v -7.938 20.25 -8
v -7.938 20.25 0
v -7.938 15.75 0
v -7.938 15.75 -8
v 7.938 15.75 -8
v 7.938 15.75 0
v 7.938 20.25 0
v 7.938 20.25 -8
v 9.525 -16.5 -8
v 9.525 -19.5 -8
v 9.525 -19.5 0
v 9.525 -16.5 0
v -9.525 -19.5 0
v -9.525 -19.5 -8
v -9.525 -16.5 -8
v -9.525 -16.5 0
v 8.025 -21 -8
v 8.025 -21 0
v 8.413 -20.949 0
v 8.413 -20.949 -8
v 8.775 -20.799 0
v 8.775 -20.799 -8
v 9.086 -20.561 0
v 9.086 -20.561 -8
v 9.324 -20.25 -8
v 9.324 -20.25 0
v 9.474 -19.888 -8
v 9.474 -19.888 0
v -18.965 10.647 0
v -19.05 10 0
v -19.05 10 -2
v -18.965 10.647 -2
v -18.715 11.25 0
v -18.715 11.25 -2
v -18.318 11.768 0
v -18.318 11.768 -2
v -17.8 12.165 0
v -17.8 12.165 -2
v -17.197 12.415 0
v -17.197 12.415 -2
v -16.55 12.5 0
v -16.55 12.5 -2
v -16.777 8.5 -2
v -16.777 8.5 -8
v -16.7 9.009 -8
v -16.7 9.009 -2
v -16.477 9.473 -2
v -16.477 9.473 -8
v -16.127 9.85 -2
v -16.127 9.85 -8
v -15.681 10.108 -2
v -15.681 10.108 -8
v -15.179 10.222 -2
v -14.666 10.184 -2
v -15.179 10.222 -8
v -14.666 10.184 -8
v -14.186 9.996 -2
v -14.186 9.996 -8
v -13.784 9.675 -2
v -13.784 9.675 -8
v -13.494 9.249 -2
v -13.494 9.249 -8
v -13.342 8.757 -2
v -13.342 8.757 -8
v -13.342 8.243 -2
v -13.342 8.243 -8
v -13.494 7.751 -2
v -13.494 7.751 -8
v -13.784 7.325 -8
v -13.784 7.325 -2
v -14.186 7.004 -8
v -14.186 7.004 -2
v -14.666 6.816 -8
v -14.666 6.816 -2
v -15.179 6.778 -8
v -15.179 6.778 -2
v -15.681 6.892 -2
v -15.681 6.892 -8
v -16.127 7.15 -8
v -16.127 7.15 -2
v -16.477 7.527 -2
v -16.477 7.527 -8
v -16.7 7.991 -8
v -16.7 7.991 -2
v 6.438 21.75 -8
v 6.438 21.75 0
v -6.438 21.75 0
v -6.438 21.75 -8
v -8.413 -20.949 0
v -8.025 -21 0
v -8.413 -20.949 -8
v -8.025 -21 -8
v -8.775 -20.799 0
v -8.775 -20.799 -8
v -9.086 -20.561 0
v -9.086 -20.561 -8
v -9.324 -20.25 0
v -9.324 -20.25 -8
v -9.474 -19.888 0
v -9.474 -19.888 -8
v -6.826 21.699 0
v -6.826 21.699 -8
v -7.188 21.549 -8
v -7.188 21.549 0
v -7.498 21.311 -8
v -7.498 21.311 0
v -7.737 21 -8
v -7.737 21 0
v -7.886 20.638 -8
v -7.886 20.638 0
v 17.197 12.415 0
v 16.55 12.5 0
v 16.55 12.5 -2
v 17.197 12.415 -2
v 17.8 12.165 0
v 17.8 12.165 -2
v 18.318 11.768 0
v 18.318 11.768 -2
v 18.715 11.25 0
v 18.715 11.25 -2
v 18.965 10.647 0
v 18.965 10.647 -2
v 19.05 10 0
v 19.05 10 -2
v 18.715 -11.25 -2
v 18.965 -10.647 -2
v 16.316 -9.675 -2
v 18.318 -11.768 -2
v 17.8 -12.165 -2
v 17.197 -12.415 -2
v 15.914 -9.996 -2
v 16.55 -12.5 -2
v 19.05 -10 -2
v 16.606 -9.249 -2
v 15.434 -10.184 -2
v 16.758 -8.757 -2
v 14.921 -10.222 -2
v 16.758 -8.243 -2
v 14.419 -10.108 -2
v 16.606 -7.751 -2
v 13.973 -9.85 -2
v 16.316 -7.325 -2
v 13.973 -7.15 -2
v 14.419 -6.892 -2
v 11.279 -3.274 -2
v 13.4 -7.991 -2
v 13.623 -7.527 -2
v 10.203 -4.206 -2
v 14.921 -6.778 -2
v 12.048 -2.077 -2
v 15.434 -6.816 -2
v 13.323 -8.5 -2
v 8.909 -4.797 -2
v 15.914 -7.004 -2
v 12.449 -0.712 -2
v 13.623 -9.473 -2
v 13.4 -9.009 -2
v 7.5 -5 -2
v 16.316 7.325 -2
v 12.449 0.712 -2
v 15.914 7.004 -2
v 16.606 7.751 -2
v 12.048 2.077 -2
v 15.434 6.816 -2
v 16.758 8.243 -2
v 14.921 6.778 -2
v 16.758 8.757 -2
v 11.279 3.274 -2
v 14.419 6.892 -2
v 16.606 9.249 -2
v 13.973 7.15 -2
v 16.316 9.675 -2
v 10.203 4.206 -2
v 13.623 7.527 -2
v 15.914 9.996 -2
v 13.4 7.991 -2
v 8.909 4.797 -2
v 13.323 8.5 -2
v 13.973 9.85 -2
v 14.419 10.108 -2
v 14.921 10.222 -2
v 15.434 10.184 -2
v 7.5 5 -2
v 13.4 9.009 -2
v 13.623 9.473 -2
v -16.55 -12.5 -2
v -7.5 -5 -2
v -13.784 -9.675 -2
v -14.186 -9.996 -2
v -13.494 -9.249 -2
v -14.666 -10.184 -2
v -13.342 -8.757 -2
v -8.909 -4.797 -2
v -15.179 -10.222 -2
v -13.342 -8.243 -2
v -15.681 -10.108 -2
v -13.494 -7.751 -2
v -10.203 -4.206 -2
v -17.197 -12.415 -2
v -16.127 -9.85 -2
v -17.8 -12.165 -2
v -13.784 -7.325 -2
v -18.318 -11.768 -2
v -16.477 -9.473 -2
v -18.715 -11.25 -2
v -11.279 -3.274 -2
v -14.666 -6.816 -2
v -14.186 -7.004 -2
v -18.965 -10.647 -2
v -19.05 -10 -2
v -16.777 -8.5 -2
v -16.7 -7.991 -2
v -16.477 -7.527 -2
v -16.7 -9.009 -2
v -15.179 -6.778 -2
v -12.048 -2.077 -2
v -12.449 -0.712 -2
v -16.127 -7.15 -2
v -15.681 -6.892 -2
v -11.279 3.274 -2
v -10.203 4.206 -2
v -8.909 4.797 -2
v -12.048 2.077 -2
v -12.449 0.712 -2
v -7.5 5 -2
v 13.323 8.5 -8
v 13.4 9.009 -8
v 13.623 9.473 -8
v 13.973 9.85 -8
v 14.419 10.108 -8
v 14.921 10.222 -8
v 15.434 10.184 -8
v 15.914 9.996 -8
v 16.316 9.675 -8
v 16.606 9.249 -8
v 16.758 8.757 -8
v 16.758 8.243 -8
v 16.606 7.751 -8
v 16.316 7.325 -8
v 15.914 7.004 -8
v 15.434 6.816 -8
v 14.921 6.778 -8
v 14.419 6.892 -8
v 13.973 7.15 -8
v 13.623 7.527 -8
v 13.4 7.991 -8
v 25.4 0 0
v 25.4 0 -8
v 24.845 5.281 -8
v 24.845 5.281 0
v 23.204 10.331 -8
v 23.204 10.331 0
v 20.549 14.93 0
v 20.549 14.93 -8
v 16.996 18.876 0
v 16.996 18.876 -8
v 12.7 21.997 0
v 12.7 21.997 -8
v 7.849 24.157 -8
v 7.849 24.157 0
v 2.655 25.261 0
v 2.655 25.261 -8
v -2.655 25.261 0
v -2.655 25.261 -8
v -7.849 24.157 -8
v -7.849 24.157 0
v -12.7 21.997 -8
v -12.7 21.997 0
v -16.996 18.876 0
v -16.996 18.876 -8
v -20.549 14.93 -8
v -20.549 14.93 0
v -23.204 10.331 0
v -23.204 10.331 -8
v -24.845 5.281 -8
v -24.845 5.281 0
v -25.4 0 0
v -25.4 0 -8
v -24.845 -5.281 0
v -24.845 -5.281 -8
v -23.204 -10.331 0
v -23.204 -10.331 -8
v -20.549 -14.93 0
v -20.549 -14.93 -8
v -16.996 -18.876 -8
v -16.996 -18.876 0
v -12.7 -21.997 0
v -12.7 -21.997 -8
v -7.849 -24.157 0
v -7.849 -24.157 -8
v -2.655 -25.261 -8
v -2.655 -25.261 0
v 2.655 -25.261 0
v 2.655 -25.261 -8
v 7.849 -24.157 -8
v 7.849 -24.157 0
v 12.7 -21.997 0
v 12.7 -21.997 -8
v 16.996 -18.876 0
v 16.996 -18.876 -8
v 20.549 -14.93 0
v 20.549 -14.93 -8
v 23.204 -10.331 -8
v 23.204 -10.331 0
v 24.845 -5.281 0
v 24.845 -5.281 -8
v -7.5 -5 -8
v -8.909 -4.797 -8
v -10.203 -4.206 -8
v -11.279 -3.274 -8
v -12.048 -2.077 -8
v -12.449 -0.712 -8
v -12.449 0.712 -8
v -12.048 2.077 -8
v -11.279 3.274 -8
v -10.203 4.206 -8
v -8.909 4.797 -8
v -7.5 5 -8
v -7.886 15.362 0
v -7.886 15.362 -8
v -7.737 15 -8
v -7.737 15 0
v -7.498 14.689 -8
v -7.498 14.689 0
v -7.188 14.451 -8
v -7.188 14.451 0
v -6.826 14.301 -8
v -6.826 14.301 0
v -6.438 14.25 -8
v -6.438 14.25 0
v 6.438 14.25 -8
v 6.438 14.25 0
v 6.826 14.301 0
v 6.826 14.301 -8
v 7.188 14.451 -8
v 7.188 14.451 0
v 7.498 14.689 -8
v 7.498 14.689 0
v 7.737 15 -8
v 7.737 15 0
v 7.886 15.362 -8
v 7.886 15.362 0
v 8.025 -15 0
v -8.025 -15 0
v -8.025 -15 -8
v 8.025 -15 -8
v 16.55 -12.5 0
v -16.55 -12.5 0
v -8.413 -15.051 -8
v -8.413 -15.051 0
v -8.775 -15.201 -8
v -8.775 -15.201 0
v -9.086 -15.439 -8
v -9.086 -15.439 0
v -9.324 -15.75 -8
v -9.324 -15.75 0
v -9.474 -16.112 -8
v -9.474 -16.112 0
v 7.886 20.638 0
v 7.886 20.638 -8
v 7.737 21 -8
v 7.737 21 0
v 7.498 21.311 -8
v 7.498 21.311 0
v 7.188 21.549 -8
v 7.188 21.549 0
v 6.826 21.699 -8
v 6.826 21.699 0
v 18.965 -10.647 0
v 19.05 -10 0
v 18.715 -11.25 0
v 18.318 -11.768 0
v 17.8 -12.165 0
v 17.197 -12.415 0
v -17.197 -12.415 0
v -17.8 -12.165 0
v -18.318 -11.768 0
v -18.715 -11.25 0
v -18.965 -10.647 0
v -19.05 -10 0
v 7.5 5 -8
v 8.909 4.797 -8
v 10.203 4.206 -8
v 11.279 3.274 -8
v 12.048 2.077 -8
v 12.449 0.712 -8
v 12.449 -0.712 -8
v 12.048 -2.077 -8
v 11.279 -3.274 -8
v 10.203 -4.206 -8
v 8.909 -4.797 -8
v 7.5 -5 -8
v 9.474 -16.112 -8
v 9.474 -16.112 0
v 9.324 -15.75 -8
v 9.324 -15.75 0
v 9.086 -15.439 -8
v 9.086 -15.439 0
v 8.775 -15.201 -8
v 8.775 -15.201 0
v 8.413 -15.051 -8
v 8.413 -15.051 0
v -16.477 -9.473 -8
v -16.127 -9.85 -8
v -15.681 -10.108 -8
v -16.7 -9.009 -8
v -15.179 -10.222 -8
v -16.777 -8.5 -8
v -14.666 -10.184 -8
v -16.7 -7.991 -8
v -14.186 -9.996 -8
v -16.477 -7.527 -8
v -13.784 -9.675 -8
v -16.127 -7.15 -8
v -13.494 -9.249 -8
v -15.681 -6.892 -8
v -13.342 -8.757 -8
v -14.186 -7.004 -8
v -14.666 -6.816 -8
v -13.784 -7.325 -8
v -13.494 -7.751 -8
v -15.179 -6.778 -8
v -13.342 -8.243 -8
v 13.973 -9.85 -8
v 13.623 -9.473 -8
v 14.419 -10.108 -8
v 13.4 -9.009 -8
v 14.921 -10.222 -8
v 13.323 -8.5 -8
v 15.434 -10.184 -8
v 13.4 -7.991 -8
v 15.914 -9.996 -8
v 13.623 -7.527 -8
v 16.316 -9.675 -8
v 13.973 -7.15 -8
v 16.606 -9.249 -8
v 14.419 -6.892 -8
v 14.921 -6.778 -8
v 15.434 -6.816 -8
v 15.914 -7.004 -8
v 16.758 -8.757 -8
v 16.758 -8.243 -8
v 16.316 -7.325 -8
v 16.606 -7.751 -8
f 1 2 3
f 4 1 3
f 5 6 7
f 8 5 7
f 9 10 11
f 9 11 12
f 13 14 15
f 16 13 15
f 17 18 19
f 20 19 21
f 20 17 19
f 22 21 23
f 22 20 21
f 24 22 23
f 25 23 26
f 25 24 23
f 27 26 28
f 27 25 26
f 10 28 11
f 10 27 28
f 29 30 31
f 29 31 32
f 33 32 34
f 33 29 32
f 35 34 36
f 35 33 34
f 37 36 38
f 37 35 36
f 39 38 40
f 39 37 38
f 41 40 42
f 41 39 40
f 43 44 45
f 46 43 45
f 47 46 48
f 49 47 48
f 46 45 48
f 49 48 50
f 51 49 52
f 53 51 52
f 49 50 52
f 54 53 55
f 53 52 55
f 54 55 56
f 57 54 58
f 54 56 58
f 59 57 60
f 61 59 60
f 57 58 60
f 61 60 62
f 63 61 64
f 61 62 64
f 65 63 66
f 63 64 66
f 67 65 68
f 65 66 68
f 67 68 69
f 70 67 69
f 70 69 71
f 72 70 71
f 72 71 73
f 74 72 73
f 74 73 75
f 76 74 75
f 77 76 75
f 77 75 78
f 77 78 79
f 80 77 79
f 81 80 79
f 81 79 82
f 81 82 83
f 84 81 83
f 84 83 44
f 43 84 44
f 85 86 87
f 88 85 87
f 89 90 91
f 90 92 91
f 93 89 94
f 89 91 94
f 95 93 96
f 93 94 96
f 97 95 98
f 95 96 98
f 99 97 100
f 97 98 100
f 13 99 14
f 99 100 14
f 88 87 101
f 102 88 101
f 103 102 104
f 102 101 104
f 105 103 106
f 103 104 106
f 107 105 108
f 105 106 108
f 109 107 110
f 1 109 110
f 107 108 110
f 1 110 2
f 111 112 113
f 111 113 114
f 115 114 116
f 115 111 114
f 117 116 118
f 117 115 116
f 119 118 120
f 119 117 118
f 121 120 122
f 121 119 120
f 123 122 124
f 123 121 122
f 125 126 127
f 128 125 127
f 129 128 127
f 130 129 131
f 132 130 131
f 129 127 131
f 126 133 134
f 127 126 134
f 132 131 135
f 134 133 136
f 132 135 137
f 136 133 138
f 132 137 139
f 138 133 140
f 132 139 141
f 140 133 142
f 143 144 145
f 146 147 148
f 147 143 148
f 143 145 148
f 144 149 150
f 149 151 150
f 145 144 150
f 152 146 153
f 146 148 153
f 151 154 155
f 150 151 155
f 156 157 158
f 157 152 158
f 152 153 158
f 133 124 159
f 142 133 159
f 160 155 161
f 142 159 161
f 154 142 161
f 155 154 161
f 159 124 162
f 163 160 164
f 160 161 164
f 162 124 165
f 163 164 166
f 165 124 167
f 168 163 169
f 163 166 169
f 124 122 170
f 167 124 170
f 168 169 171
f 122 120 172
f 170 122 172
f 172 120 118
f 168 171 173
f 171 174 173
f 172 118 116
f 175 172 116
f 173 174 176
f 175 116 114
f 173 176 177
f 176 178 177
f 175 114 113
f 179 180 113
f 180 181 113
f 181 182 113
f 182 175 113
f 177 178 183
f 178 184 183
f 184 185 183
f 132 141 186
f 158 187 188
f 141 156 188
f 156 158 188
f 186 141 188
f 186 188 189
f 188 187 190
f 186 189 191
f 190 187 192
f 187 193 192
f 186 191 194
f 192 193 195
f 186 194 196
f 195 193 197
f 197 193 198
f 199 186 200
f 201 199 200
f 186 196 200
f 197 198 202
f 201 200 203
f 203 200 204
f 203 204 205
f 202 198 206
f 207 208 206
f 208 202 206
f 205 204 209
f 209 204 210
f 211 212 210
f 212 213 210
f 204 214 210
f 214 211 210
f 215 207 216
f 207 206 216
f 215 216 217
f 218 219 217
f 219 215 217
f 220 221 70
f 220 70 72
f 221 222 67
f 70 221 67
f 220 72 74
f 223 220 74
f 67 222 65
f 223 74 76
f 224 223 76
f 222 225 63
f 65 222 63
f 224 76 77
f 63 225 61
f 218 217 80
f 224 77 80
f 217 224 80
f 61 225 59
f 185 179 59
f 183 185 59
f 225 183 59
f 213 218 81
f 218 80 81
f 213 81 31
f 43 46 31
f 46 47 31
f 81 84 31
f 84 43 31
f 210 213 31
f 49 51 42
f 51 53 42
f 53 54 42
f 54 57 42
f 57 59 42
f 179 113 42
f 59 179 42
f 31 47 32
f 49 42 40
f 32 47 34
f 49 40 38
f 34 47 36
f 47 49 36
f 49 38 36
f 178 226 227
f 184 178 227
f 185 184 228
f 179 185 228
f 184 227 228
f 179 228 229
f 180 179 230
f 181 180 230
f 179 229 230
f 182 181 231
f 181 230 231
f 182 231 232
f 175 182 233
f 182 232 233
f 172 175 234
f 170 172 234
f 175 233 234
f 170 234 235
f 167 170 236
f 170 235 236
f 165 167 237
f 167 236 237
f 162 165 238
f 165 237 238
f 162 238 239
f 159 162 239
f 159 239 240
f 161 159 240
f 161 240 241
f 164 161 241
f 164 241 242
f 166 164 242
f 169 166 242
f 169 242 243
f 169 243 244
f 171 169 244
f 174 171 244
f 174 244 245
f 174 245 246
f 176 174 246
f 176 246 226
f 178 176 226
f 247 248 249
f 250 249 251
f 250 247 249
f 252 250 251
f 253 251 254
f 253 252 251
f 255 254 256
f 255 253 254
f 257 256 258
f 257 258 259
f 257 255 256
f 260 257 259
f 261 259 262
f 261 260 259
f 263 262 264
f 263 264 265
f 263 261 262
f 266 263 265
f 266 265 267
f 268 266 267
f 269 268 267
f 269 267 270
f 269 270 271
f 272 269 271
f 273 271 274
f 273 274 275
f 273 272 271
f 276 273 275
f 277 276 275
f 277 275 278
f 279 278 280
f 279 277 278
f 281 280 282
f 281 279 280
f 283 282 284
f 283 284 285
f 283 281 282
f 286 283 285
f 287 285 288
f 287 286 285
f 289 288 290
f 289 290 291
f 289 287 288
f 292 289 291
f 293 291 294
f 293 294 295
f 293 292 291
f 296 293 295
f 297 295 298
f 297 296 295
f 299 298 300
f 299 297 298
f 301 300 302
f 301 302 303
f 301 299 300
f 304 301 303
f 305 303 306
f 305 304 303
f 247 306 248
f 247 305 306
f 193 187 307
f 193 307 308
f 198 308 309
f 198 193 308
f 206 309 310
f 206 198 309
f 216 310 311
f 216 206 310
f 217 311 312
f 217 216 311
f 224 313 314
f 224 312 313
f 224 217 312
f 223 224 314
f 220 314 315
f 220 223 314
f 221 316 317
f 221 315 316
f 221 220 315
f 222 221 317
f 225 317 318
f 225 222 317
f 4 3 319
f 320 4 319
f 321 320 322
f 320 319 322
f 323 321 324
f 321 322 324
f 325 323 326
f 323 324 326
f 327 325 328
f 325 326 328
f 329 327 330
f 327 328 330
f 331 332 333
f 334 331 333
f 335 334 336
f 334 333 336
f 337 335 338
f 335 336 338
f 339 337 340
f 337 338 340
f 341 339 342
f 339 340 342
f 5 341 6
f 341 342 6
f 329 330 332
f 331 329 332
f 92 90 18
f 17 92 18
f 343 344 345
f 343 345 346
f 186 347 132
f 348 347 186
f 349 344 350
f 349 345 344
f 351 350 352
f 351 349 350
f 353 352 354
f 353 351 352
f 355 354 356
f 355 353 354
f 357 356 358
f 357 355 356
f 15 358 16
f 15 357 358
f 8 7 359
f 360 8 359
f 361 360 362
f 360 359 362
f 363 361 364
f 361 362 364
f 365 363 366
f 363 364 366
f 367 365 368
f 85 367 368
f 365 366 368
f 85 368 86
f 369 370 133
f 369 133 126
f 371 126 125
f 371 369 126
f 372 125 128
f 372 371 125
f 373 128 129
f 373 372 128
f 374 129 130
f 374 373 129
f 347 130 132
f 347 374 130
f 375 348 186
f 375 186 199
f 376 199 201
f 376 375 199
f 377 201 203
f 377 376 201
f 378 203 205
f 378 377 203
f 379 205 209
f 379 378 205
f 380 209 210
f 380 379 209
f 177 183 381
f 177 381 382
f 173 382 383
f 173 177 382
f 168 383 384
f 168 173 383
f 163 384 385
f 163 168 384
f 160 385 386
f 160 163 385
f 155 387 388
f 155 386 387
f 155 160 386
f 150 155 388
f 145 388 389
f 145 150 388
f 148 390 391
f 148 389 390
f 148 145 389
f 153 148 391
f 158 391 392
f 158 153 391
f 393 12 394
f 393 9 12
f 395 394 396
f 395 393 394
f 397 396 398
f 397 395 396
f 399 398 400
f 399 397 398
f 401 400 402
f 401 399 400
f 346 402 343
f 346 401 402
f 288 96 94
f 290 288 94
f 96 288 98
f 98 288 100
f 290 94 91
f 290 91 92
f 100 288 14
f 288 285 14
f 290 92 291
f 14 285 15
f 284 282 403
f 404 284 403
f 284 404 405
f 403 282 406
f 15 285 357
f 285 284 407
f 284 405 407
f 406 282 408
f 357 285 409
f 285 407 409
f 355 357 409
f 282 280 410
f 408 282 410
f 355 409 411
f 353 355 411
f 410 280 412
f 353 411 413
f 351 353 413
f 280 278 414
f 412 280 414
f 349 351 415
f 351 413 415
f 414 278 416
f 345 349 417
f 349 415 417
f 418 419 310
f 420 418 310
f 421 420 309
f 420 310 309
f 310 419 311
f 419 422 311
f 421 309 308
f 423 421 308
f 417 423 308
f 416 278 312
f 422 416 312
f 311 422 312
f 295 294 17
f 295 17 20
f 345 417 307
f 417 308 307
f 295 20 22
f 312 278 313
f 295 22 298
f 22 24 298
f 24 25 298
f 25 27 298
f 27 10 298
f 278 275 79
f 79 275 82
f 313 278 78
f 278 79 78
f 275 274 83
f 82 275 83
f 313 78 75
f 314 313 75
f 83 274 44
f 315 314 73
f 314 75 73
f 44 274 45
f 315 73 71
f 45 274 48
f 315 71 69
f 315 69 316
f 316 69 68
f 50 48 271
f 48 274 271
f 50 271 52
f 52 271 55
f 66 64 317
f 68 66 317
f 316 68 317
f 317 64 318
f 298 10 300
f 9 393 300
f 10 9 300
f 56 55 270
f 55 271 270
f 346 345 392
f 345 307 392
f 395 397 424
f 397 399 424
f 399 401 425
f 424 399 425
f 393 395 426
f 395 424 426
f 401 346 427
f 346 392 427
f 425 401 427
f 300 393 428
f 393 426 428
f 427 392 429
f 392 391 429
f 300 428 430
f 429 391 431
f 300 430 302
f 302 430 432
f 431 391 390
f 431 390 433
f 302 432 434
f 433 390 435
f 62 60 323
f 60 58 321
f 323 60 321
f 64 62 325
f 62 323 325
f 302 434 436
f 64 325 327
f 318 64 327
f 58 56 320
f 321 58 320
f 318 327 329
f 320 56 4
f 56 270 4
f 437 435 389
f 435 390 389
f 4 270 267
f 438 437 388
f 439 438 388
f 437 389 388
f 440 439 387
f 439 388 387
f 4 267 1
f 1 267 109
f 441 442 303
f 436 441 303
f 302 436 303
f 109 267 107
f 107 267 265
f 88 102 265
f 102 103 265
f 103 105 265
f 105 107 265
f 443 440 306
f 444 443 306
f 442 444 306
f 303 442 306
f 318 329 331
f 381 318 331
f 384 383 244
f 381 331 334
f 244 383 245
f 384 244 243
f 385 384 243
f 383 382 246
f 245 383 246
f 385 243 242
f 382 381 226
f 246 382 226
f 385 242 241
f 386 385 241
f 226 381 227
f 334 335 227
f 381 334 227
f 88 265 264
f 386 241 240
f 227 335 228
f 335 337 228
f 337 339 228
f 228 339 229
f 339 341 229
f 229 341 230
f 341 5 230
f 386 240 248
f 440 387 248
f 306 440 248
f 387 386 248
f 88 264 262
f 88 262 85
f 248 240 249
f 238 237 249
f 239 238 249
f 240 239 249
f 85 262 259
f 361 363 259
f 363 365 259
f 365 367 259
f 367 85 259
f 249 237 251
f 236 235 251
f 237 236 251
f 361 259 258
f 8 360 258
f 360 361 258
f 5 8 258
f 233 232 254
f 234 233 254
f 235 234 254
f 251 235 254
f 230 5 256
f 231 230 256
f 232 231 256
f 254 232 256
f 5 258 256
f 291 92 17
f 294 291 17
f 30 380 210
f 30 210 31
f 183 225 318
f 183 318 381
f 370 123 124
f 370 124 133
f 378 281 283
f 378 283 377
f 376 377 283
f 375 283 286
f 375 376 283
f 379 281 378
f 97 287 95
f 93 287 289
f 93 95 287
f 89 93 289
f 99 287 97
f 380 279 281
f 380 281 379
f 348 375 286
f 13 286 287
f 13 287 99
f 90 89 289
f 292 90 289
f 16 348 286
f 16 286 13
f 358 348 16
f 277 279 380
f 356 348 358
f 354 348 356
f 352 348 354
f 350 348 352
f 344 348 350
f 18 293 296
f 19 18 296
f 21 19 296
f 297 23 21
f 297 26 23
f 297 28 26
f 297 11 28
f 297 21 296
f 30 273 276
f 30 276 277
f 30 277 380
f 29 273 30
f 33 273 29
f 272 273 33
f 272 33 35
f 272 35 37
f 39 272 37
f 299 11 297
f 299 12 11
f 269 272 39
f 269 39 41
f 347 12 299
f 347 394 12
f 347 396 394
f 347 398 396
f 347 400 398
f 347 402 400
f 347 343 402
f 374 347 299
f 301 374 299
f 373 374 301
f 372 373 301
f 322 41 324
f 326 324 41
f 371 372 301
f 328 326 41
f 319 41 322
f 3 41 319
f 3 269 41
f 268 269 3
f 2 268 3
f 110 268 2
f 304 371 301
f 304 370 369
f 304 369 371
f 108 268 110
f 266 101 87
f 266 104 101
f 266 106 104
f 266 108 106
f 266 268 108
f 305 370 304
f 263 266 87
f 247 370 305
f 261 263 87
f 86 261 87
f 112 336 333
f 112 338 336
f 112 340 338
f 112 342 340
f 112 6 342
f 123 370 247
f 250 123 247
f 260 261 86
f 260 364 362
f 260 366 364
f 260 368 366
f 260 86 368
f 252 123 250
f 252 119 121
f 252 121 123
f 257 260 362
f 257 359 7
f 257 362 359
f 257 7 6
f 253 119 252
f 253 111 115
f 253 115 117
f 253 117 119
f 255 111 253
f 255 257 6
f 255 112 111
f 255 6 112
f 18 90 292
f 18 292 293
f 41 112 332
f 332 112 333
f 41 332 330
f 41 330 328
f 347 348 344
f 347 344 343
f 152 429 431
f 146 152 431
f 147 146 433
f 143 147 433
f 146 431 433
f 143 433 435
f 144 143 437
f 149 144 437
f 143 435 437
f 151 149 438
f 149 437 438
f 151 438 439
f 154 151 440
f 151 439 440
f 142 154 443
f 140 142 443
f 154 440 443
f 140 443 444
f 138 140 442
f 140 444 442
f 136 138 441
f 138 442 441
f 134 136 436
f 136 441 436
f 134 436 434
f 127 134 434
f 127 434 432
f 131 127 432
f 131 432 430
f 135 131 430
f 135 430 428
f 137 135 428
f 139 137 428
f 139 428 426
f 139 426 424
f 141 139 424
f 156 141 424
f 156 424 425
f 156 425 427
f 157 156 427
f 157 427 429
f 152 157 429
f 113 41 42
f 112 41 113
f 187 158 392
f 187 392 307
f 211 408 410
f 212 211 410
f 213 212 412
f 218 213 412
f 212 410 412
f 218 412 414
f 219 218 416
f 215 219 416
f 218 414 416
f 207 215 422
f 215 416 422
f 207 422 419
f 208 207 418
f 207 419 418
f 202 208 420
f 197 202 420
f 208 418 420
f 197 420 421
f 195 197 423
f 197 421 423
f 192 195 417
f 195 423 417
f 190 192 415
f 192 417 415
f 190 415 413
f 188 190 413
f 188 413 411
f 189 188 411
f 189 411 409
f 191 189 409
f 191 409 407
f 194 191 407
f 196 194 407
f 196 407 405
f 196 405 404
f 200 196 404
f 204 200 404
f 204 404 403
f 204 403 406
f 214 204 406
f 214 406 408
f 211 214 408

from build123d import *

# Parameters (mm, degrees)
SKETCH1_R             = 25.4
BOSS_EXTRUDE1_DEPTH   = 8
CUT_EXTRUDE1_DEPTH    = 2
CUT_EXTRUDE2_DEPTH    = 37.418676527
F_8_32_TAPPED_HOLE1_D = 3.4544
CUT_EXTRUDE3_DEPTH    = 37.80108694
SKETCH7_W             = 19.05
SKETCH7_H             = 6
CUT_EXTRUDE4_DEPTH    = 37.80108694
FILLET1_R             = 1.5


with BuildPart() as part:
    # Sketch1 → Boss-Extrude1 (new body)
    with BuildSketch(Plane.XY):
        Circle(SKETCH1_R)
    extrude(amount=-BOSS_EXTRUDE1_DEPTH)

    # Sketch2 → Cut-Extrude1 (cut)
    with BuildSketch(Plane.XY):
        with BuildLine():
            Line((-16.55, 12.5), (16.55, 12.5))
            ThreePointArc((16.55, 12.5), (18.317766953, 11.767766953), (19.05, 10))
            Line((19.05, 10), (19.05, -10))
            ThreePointArc((19.05, -10), (18.317766953, -11.767766953), (16.55, -12.5))
            Line((16.55, -12.5), (-16.55, -12.5))
            ThreePointArc((-16.55, -12.5), (-18.317766953, -11.767766953), (-19.05, -10))
            Line((-19.05, -10), (-19.05, 10))
            ThreePointArc((-19.05, 10), (-18.317766953, 11.767766953), (-16.55, 12.5))
        make_face()
    extrude(amount=-CUT_EXTRUDE1_DEPTH, mode=Mode.SUBTRACT)

    # Sketch3 → Cut-Extrude2 (cut, through all)
    with BuildSketch(Plane.XY.offset(-2)):
        with BuildLine():
            Line((-7.5, 5), (7.5, 5))
            ThreePointArc((7.5, 5), (12.5, 0), (7.5, -5))
            Line((7.5, -5), (-7.5, -5))
            ThreePointArc((-7.5, -5), (-12.5, 0), (-7.5, 5))
        make_face()
    extrude(amount=-CUT_EXTRUDE2_DEPTH, mode=Mode.SUBTRACT)

    # #8-32 Tapped Hole1 (through all)
    with Locations(Plane.XY.offset(-2)):
        with Locations((15.05, 8.5), (-15.05, 8.5), (-15.05, -8.5), (15.05, -8.5)):
            Hole(F_8_32_TAPPED_HOLE1_D / 2)

    # Sketch6 → Cut-Extrude3 (cut, through all)
    with BuildSketch(Plane.XY):
        with BuildLine():
            Line((6.4375, 21.75), (-6.4375, 21.75))
            ThreePointArc((-6.4375, 21.75), (-7.498160172, 21.310660172), (-7.9375, 20.25))
            Line((-7.9375, 20.25), (-7.9375, 15.75))
            ThreePointArc((-7.9375, 15.75), (-7.498160172, 14.689339828), (-6.4375, 14.25))
            Line((-6.4375, 14.25), (6.4375, 14.25))
            ThreePointArc((6.4375, 14.25), (7.498160172, 14.689339828), (7.9375, 15.75))
            Line((7.9375, 15.75), (7.9375, 20.25))
            ThreePointArc((7.9375, 20.25), (7.498160172, 21.310660172), (6.4375, 21.75))
        make_face()
    extrude(amount=-CUT_EXTRUDE3_DEPTH, mode=Mode.SUBTRACT)

    # Sketch7 → Cut-Extrude4 (cut, through all)
    with BuildSketch(Plane.XY):
        with Locations((0, -18)):
            Rectangle(SKETCH7_W, SKETCH7_H)
    extrude(amount=-CUT_EXTRUDE4_DEPTH, mode=Mode.SUBTRACT)

    # Fillet1
    fillet1_edges = [part.edges().sort_by_distance(p)[0] for p in [
        (9.525, -15, -4),
        (9.525, -21, -4),
        (-9.525, -21, -4),
        (-9.525, -15, -4),
    ]]
    fillet(fillet1_edges, radius=FILLET1_R)


solid = part.part
